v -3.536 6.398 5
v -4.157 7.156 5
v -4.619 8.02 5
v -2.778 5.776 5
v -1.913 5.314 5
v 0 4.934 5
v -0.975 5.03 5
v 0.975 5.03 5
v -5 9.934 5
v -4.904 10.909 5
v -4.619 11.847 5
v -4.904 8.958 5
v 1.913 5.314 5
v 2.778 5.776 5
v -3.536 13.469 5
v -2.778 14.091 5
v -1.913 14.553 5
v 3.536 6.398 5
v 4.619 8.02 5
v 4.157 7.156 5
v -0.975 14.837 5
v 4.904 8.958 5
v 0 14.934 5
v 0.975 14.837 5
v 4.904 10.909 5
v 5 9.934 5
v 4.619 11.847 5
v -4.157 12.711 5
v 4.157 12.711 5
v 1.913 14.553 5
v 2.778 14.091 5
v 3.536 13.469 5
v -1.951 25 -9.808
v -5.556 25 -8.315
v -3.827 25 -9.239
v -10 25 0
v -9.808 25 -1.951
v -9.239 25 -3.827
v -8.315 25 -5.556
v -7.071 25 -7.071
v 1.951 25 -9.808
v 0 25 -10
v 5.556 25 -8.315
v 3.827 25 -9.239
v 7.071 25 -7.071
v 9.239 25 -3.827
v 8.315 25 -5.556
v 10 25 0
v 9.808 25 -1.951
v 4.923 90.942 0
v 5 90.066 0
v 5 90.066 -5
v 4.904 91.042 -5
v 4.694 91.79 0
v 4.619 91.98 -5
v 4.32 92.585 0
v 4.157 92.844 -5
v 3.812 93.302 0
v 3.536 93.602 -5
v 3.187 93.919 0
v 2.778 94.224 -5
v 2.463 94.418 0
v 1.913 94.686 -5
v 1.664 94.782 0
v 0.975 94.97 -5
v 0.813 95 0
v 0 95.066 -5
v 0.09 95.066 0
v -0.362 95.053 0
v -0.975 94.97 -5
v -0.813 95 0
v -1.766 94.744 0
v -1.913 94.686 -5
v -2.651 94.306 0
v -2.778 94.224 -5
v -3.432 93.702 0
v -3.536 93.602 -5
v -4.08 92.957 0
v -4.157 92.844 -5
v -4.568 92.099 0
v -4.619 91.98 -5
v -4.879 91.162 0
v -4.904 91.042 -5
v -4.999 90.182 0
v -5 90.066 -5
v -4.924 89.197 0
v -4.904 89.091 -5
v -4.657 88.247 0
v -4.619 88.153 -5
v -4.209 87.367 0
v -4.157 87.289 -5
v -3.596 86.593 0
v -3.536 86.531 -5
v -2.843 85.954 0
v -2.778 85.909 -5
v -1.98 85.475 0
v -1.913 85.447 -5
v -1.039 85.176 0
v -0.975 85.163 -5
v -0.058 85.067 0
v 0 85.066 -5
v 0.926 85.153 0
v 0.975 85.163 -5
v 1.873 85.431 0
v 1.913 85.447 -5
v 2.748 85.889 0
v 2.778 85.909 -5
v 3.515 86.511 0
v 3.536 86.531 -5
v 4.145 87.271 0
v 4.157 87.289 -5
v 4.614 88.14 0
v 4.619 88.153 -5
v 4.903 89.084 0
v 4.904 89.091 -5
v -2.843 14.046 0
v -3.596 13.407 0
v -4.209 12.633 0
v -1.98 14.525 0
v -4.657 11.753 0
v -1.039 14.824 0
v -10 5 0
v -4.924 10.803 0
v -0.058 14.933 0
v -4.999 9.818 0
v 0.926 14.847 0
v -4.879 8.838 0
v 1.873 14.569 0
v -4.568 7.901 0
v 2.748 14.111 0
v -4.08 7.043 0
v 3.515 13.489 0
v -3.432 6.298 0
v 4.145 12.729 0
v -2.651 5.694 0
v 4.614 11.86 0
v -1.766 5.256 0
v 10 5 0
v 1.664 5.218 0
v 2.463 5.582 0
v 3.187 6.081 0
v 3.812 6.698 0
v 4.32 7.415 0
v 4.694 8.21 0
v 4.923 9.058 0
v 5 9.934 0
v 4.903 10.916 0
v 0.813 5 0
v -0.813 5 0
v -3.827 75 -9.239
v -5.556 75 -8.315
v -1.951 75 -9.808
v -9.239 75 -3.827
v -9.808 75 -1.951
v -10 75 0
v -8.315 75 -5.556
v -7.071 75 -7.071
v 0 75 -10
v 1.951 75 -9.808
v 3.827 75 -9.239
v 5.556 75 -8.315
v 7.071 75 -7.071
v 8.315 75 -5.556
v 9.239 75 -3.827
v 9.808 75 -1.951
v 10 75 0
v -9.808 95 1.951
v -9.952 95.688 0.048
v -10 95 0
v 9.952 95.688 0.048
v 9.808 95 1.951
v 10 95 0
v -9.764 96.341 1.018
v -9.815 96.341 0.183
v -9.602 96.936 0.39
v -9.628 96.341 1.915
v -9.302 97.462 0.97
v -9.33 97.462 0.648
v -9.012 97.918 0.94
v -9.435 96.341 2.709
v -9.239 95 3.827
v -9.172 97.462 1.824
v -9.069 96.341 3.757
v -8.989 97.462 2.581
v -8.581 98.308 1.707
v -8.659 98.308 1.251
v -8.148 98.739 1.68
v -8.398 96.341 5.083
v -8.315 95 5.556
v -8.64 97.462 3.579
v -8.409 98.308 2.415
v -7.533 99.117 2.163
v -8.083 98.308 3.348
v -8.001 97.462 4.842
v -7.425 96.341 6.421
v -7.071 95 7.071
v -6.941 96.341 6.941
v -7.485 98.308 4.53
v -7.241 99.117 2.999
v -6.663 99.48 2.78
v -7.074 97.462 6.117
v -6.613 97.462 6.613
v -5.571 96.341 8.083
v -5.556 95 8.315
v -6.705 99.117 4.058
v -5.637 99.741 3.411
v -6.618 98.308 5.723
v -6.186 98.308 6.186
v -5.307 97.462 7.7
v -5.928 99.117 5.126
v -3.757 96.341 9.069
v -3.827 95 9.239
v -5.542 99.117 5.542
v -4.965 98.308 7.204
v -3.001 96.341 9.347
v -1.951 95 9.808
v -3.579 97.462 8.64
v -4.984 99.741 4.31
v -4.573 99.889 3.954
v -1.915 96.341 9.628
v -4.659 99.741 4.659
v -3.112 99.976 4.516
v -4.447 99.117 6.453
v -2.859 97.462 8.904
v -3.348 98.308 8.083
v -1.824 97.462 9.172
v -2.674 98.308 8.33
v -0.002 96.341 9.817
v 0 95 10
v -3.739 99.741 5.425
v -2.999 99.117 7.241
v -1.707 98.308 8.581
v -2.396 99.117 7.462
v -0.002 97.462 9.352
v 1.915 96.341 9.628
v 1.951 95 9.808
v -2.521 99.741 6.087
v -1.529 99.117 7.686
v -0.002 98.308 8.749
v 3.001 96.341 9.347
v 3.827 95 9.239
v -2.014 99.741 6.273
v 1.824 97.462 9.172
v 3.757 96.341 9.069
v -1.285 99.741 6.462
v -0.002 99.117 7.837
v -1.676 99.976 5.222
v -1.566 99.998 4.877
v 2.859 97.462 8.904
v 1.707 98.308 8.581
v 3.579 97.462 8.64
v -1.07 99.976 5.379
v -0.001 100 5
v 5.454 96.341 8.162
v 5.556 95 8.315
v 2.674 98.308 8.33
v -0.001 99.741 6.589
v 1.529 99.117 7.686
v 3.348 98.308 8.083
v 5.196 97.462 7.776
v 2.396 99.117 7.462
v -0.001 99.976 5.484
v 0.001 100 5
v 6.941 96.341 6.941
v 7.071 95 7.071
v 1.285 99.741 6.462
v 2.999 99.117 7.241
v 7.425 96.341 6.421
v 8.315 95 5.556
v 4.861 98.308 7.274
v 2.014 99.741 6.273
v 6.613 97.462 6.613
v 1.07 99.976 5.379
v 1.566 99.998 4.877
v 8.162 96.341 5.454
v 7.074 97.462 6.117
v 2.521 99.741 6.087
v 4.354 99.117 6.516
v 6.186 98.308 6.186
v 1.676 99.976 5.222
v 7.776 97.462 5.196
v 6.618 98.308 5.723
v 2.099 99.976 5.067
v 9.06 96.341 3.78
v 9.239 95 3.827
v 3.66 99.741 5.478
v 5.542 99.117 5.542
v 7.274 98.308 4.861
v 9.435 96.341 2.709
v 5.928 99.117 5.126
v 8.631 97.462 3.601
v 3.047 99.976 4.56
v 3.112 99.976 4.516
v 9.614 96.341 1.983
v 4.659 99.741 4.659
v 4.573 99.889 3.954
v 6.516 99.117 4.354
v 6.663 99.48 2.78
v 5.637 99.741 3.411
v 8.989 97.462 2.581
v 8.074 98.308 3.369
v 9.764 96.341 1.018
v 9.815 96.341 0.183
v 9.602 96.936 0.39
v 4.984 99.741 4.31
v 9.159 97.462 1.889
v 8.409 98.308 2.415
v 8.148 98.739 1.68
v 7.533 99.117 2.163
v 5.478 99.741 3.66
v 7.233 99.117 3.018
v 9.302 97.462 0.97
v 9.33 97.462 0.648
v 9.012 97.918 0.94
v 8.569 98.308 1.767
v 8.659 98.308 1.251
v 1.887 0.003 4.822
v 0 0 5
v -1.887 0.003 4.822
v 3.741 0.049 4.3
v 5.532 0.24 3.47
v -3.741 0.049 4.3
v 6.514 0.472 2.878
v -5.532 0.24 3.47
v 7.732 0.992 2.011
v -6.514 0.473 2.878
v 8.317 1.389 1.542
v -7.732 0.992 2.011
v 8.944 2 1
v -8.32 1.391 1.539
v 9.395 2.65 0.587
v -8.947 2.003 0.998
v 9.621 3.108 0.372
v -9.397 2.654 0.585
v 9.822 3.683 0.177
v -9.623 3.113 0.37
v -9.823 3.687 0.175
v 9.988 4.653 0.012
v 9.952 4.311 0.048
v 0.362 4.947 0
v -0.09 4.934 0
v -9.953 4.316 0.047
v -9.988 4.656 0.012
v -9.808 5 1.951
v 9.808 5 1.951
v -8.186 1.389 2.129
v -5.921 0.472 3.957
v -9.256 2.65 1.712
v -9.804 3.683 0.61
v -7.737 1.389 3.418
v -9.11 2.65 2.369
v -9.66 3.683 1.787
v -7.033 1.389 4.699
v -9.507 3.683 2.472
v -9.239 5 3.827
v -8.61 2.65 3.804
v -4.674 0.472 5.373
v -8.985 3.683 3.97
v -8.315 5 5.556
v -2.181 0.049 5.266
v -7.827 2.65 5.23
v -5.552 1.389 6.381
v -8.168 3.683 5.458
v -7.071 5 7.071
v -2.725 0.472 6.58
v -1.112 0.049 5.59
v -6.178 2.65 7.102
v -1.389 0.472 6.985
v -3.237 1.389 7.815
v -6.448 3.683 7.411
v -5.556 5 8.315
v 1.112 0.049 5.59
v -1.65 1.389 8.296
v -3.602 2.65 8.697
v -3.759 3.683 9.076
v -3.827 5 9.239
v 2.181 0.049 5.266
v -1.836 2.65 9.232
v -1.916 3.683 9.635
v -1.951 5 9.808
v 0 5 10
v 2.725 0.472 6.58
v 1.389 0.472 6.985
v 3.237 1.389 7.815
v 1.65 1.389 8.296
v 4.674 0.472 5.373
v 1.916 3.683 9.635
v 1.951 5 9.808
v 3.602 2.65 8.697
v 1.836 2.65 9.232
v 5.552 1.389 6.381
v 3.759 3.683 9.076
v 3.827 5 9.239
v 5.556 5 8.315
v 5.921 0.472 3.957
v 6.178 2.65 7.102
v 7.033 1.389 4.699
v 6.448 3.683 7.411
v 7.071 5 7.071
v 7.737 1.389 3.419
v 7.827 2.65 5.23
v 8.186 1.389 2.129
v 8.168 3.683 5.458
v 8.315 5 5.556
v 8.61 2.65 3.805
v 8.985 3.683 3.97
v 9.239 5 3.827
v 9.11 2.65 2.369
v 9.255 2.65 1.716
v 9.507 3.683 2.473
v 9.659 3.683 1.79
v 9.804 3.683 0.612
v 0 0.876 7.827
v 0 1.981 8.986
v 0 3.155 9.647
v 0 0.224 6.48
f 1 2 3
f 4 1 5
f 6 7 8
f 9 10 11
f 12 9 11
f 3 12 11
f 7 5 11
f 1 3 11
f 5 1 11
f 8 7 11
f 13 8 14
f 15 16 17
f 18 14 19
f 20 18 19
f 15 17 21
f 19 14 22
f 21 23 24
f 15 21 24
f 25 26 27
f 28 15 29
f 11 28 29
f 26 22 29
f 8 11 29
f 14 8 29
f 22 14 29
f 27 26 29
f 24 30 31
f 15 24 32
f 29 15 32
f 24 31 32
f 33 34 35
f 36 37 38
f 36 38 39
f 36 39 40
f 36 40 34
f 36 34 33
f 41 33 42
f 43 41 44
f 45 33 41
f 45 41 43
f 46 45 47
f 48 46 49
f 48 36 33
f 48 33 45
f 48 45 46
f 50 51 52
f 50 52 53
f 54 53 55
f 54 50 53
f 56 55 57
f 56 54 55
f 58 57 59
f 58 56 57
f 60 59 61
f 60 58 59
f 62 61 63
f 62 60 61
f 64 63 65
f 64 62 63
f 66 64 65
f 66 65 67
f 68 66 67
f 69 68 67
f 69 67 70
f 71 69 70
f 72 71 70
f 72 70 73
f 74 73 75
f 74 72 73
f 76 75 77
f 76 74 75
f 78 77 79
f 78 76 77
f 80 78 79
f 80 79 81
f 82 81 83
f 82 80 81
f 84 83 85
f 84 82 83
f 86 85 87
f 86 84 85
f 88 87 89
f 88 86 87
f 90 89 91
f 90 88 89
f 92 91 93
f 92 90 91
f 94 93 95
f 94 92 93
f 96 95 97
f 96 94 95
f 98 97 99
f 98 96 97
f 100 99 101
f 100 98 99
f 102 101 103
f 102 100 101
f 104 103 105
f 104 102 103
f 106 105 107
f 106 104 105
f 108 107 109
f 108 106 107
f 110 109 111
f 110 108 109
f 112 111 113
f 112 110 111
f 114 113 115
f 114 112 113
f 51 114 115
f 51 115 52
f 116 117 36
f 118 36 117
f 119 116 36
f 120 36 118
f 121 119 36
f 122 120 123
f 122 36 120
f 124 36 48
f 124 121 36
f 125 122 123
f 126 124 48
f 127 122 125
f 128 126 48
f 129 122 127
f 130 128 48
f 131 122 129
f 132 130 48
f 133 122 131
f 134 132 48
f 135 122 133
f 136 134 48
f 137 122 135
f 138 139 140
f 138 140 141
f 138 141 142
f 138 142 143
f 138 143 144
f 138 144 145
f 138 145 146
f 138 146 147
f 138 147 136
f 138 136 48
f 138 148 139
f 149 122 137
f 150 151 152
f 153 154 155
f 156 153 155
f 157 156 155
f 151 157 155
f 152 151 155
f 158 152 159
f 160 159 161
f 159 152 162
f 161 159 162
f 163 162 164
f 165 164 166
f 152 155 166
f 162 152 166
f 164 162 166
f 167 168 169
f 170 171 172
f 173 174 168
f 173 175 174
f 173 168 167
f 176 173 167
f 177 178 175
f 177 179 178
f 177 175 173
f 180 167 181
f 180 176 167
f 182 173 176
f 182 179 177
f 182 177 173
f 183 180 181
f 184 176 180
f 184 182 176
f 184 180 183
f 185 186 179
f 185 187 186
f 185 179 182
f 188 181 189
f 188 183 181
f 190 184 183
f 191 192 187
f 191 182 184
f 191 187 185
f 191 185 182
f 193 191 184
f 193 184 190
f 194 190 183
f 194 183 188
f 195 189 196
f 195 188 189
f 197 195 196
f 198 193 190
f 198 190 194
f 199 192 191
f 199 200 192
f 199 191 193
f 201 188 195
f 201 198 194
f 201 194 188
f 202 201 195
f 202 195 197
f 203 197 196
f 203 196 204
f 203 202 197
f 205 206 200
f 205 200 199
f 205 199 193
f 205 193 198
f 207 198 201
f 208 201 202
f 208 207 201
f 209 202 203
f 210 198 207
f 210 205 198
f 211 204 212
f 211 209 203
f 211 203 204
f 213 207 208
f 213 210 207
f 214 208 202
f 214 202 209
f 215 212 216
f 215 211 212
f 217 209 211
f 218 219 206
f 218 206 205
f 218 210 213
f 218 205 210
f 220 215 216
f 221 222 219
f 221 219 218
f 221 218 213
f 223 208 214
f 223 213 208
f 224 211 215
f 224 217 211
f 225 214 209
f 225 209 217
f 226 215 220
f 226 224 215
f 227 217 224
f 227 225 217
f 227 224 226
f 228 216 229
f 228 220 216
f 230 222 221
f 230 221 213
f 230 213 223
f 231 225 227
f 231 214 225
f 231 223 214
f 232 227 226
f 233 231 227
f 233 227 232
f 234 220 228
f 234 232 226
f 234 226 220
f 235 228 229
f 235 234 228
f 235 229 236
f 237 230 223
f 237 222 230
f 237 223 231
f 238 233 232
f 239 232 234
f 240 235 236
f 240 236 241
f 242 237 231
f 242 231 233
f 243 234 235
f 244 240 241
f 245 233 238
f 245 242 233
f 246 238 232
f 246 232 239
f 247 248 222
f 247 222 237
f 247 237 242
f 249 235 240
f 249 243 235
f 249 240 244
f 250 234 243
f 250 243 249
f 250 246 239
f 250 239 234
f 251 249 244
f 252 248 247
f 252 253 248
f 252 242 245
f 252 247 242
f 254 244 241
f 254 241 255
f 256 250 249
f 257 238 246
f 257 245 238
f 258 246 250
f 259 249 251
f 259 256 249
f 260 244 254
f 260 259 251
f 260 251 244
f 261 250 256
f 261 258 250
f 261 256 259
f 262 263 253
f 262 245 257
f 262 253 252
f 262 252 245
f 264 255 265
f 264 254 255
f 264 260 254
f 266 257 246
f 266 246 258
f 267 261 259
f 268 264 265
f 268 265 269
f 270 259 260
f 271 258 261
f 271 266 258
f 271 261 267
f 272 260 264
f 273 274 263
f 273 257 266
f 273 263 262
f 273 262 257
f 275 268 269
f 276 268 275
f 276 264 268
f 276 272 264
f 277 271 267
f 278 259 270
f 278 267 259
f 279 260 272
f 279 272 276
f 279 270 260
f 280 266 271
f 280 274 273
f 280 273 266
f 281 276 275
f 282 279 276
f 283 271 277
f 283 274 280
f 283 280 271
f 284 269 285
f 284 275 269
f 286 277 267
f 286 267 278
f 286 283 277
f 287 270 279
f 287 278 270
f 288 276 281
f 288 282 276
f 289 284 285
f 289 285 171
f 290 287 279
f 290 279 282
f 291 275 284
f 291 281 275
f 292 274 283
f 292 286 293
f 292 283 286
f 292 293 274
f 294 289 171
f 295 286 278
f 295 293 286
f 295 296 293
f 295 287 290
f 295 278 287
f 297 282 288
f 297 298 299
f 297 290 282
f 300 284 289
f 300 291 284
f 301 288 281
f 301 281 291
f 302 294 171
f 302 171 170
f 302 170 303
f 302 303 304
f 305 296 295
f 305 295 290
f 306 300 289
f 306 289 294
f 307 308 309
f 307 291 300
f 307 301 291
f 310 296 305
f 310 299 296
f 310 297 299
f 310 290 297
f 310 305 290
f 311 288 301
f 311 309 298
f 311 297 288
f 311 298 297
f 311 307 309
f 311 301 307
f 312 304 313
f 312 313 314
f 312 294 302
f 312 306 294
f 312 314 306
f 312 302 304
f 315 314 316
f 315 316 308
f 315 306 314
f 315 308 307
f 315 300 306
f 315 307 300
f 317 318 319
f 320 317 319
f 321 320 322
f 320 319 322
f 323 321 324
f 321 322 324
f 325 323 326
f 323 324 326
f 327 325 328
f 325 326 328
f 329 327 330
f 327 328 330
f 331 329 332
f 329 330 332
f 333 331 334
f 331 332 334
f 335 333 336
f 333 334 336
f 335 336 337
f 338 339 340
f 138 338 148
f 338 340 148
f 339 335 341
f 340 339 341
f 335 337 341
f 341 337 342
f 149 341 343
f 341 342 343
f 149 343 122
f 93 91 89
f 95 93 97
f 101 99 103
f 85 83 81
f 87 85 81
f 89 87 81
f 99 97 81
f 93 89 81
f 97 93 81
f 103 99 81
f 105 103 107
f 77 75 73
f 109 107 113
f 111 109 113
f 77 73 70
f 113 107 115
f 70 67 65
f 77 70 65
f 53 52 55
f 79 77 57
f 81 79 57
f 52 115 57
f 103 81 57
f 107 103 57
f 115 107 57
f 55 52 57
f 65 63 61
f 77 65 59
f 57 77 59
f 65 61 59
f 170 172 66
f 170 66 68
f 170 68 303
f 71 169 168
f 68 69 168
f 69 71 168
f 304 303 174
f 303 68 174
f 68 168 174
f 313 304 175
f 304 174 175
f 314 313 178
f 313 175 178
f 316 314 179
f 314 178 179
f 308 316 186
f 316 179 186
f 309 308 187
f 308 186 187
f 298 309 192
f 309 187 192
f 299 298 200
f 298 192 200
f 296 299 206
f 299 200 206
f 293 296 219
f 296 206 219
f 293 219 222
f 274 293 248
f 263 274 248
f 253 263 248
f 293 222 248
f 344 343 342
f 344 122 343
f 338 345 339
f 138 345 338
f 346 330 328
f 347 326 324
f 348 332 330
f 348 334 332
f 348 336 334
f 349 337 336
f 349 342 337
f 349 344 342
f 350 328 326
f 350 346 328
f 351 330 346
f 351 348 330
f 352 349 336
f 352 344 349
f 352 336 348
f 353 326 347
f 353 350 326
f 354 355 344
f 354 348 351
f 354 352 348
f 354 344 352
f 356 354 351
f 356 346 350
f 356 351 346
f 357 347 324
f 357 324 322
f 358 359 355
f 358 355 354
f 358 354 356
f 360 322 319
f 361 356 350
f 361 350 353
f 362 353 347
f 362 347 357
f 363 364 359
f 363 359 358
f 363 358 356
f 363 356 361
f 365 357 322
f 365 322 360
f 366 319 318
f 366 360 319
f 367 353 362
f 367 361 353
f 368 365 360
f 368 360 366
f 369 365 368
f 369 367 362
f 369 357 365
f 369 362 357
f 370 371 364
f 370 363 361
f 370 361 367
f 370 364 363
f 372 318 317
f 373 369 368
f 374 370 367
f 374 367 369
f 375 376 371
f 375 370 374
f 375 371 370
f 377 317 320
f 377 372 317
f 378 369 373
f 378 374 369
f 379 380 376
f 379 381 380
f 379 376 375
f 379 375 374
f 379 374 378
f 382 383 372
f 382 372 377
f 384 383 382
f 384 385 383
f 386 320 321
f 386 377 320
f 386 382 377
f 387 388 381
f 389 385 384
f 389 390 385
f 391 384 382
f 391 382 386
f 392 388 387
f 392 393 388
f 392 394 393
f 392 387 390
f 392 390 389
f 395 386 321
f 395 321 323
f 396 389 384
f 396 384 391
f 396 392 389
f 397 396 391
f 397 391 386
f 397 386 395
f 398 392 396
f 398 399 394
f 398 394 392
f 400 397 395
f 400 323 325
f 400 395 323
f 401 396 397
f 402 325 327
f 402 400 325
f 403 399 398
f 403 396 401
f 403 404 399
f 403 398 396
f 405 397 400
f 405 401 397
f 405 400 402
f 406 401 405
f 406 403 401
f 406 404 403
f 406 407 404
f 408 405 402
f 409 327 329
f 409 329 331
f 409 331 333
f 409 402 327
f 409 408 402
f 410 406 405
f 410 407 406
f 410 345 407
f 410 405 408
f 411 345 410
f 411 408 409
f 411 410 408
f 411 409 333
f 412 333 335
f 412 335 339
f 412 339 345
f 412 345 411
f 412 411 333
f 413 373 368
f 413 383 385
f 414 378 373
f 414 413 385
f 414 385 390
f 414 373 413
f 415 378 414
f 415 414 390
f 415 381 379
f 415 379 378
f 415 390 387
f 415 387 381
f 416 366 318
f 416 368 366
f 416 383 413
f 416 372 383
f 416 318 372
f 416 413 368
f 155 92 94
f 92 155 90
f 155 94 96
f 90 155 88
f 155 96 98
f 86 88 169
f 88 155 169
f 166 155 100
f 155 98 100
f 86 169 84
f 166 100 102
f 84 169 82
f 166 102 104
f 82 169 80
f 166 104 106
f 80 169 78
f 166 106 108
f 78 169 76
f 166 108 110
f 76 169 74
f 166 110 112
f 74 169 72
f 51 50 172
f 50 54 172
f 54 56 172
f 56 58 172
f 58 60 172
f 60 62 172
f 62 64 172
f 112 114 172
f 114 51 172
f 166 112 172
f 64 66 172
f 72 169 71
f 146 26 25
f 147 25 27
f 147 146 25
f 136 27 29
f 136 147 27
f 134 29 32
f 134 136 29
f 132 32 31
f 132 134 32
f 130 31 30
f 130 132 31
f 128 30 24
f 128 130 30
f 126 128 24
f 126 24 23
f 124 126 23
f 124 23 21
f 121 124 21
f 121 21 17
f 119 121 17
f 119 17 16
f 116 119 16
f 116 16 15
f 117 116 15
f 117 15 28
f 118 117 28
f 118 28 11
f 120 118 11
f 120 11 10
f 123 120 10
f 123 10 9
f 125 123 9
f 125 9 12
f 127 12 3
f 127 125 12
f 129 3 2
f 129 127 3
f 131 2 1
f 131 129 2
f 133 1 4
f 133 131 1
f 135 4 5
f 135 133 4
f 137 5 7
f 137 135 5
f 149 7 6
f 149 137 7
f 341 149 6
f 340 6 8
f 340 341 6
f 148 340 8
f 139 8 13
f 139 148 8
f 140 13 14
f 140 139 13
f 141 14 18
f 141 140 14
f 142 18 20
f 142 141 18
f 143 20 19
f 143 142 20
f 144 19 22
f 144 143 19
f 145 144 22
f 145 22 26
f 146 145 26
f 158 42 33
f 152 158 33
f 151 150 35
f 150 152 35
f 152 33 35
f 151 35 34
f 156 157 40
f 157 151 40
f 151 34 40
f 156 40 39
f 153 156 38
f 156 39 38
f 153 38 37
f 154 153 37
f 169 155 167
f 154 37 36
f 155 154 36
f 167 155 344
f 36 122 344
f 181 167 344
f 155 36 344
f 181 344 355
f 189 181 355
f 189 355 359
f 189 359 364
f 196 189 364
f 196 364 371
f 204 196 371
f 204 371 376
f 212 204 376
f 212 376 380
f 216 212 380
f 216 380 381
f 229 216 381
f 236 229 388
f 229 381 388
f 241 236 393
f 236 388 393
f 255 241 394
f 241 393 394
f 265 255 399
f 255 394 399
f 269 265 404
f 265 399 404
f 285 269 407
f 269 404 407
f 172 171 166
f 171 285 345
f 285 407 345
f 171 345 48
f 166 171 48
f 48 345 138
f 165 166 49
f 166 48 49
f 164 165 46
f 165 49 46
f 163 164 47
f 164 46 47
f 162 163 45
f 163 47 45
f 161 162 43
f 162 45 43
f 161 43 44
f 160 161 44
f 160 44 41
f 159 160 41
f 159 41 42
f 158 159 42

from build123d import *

# Parameters (mm, degrees)
SKETCH1_R           = 10
BOSS_EXTRUDE1_DEPTH = 100
SKETCH4_W           = 20
SKETCH4_H           = 25
CUT_EXTRUDE2_DEPTH  = 10
SKETCH7_R           = 5
BOSS_EXTRUDE2_DEPTH = 5
FILLET7_R           = 5
SKETCH9_R           = 5
CUT_EXTRUDE3_DEPTH  = 5
FILLET8_R           = 5


with BuildPart() as part:
    # Sketch1 → Boss-Extrude1 (new body)
    with BuildSketch(Plane(origin=(0, 0, 0), x_dir=(1, 0, 0), z_dir=(0, 1, 0))):
        with Locations(Location((0, 0, 0), (0, 0, 90))):
            Circle(SKETCH1_R)
    extrude(amount=BOSS_EXTRUDE1_DEPTH)

    # Sketch4 → Cut-Extrude2 (cut)
    with BuildSketch(Plane.XY):
        with Locations((0, 87.5)):
            Rectangle(SKETCH4_W, SKETCH4_H)
    cut_extrude2 = extrude(amount=-CUT_EXTRUDE2_DEPTH, mode=Mode.SUBTRACT)

    # Sketch7 → Boss-Extrude2 (add)
    with BuildSketch(Plane.XY):
        with Locations((0, 90.066469536)):
            Circle(SKETCH7_R)
        with Locations((0, 9.933530464)):
            Circle(SKETCH7_R)
    extrude(amount=-BOSS_EXTRUDE2_DEPTH)

    # Fillet7
    # the kernel refuses this fillet: 5 mm, written as the material it takes off along each edge
    with BuildSketch(Plane(origin=(-22.5, 100, 0), x_dir=(0, -1, 0), z_dir=(1, 0, 0))) as fillet7_piece_1_section:
        with BuildLine():
            CenterArc((FILLET7_R, -FILLET7_R), FILLET7_R, 90, 90)
            Line((0, -FILLET7_R), (0, 0))
            Line((0, 0), (FILLET7_R, 0))
        make_face()
    fillet7_piece_1 = extrude(amount=45, mode=Mode.PRIVATE)
    fillet7_piece_1 = fillet7_piece_1 - Plane(origin=(0, 90.066469536, 1.132005312), x_dir=(1, 0, 0), z_dir=(0, 0, 1)) * Cylinder(5, 110, mode=Mode.PRIVATE)
    add(fillet7_piece_1, mode=Mode.SUBTRACT)
    with BuildSketch(Plane(origin=(0, 100, 0), x_dir=(-0.3134140431814407, 0, -0.9496165739584909), z_dir=(0.9496165739584909, 0, -0.3134140431814407))) as fillet7_piece_2:
        with BuildLine():
            CenterArc((10 - FILLET7_R, -FILLET7_R), FILLET7_R, 0, 90)
            Line((10 - FILLET7_R, 0), (10, 0))
            Line((10, 0), (10, -FILLET7_R))
        make_face()
    revolve(axis=Axis((0, 100, 0), (0, 1, 0)), revolution_arc=323.469804901, mode=Mode.SUBTRACT)

    # Mirror3: Cut-Extrude2 across plane
    add(cut_extrude2.mirror(Plane.ZX.offset(50)), mode=Mode.SUBTRACT)

    # Sketch9 → Cut-Extrude3 (cut)
    with BuildSketch(Plane.XY):
        with Locations((0, 9.933530464)):
            Circle(SKETCH9_R)
    extrude(amount=CUT_EXTRUDE3_DEPTH, mode=Mode.SUBTRACT)

    # Fillet8
    # the kernel refuses this fillet: 5 mm, written as the material it takes off along each edge
    with BuildSketch(Plane(origin=(0, 0, 0), x_dir=(-0.31341404318144095, 0, -0.9496165739584909), z_dir=(0.9496165739584909, 0, -0.31341404318144095))) as fillet8_piece_1:
        with BuildLine():
            CenterArc((10 - FILLET8_R, FILLET8_R), FILLET8_R, 270, 90)
            Line((10 - FILLET8_R, 0), (10, 0))
            Line((10, 0), (10, FILLET8_R))
        make_face()
    revolve(axis=Axis((0, 0, 0), (0, 1, 0)), revolution_arc=323.469804901, mode=Mode.SUBTRACT)
    with BuildSketch(Plane(origin=(-22.5, 0, 0), x_dir=(0, 0, 1), z_dir=(1, 0, 0))) as fillet8_piece_2:
        with BuildLine():
            CenterArc((FILLET8_R, -FILLET8_R), FILLET8_R, 90, 90)
            Line((0, -FILLET8_R), (0, 0))
            Line((0, 0), (FILLET8_R, 0))
        make_face()
    extrude(amount=45, mode=Mode.SUBTRACT)


solid = part.part
